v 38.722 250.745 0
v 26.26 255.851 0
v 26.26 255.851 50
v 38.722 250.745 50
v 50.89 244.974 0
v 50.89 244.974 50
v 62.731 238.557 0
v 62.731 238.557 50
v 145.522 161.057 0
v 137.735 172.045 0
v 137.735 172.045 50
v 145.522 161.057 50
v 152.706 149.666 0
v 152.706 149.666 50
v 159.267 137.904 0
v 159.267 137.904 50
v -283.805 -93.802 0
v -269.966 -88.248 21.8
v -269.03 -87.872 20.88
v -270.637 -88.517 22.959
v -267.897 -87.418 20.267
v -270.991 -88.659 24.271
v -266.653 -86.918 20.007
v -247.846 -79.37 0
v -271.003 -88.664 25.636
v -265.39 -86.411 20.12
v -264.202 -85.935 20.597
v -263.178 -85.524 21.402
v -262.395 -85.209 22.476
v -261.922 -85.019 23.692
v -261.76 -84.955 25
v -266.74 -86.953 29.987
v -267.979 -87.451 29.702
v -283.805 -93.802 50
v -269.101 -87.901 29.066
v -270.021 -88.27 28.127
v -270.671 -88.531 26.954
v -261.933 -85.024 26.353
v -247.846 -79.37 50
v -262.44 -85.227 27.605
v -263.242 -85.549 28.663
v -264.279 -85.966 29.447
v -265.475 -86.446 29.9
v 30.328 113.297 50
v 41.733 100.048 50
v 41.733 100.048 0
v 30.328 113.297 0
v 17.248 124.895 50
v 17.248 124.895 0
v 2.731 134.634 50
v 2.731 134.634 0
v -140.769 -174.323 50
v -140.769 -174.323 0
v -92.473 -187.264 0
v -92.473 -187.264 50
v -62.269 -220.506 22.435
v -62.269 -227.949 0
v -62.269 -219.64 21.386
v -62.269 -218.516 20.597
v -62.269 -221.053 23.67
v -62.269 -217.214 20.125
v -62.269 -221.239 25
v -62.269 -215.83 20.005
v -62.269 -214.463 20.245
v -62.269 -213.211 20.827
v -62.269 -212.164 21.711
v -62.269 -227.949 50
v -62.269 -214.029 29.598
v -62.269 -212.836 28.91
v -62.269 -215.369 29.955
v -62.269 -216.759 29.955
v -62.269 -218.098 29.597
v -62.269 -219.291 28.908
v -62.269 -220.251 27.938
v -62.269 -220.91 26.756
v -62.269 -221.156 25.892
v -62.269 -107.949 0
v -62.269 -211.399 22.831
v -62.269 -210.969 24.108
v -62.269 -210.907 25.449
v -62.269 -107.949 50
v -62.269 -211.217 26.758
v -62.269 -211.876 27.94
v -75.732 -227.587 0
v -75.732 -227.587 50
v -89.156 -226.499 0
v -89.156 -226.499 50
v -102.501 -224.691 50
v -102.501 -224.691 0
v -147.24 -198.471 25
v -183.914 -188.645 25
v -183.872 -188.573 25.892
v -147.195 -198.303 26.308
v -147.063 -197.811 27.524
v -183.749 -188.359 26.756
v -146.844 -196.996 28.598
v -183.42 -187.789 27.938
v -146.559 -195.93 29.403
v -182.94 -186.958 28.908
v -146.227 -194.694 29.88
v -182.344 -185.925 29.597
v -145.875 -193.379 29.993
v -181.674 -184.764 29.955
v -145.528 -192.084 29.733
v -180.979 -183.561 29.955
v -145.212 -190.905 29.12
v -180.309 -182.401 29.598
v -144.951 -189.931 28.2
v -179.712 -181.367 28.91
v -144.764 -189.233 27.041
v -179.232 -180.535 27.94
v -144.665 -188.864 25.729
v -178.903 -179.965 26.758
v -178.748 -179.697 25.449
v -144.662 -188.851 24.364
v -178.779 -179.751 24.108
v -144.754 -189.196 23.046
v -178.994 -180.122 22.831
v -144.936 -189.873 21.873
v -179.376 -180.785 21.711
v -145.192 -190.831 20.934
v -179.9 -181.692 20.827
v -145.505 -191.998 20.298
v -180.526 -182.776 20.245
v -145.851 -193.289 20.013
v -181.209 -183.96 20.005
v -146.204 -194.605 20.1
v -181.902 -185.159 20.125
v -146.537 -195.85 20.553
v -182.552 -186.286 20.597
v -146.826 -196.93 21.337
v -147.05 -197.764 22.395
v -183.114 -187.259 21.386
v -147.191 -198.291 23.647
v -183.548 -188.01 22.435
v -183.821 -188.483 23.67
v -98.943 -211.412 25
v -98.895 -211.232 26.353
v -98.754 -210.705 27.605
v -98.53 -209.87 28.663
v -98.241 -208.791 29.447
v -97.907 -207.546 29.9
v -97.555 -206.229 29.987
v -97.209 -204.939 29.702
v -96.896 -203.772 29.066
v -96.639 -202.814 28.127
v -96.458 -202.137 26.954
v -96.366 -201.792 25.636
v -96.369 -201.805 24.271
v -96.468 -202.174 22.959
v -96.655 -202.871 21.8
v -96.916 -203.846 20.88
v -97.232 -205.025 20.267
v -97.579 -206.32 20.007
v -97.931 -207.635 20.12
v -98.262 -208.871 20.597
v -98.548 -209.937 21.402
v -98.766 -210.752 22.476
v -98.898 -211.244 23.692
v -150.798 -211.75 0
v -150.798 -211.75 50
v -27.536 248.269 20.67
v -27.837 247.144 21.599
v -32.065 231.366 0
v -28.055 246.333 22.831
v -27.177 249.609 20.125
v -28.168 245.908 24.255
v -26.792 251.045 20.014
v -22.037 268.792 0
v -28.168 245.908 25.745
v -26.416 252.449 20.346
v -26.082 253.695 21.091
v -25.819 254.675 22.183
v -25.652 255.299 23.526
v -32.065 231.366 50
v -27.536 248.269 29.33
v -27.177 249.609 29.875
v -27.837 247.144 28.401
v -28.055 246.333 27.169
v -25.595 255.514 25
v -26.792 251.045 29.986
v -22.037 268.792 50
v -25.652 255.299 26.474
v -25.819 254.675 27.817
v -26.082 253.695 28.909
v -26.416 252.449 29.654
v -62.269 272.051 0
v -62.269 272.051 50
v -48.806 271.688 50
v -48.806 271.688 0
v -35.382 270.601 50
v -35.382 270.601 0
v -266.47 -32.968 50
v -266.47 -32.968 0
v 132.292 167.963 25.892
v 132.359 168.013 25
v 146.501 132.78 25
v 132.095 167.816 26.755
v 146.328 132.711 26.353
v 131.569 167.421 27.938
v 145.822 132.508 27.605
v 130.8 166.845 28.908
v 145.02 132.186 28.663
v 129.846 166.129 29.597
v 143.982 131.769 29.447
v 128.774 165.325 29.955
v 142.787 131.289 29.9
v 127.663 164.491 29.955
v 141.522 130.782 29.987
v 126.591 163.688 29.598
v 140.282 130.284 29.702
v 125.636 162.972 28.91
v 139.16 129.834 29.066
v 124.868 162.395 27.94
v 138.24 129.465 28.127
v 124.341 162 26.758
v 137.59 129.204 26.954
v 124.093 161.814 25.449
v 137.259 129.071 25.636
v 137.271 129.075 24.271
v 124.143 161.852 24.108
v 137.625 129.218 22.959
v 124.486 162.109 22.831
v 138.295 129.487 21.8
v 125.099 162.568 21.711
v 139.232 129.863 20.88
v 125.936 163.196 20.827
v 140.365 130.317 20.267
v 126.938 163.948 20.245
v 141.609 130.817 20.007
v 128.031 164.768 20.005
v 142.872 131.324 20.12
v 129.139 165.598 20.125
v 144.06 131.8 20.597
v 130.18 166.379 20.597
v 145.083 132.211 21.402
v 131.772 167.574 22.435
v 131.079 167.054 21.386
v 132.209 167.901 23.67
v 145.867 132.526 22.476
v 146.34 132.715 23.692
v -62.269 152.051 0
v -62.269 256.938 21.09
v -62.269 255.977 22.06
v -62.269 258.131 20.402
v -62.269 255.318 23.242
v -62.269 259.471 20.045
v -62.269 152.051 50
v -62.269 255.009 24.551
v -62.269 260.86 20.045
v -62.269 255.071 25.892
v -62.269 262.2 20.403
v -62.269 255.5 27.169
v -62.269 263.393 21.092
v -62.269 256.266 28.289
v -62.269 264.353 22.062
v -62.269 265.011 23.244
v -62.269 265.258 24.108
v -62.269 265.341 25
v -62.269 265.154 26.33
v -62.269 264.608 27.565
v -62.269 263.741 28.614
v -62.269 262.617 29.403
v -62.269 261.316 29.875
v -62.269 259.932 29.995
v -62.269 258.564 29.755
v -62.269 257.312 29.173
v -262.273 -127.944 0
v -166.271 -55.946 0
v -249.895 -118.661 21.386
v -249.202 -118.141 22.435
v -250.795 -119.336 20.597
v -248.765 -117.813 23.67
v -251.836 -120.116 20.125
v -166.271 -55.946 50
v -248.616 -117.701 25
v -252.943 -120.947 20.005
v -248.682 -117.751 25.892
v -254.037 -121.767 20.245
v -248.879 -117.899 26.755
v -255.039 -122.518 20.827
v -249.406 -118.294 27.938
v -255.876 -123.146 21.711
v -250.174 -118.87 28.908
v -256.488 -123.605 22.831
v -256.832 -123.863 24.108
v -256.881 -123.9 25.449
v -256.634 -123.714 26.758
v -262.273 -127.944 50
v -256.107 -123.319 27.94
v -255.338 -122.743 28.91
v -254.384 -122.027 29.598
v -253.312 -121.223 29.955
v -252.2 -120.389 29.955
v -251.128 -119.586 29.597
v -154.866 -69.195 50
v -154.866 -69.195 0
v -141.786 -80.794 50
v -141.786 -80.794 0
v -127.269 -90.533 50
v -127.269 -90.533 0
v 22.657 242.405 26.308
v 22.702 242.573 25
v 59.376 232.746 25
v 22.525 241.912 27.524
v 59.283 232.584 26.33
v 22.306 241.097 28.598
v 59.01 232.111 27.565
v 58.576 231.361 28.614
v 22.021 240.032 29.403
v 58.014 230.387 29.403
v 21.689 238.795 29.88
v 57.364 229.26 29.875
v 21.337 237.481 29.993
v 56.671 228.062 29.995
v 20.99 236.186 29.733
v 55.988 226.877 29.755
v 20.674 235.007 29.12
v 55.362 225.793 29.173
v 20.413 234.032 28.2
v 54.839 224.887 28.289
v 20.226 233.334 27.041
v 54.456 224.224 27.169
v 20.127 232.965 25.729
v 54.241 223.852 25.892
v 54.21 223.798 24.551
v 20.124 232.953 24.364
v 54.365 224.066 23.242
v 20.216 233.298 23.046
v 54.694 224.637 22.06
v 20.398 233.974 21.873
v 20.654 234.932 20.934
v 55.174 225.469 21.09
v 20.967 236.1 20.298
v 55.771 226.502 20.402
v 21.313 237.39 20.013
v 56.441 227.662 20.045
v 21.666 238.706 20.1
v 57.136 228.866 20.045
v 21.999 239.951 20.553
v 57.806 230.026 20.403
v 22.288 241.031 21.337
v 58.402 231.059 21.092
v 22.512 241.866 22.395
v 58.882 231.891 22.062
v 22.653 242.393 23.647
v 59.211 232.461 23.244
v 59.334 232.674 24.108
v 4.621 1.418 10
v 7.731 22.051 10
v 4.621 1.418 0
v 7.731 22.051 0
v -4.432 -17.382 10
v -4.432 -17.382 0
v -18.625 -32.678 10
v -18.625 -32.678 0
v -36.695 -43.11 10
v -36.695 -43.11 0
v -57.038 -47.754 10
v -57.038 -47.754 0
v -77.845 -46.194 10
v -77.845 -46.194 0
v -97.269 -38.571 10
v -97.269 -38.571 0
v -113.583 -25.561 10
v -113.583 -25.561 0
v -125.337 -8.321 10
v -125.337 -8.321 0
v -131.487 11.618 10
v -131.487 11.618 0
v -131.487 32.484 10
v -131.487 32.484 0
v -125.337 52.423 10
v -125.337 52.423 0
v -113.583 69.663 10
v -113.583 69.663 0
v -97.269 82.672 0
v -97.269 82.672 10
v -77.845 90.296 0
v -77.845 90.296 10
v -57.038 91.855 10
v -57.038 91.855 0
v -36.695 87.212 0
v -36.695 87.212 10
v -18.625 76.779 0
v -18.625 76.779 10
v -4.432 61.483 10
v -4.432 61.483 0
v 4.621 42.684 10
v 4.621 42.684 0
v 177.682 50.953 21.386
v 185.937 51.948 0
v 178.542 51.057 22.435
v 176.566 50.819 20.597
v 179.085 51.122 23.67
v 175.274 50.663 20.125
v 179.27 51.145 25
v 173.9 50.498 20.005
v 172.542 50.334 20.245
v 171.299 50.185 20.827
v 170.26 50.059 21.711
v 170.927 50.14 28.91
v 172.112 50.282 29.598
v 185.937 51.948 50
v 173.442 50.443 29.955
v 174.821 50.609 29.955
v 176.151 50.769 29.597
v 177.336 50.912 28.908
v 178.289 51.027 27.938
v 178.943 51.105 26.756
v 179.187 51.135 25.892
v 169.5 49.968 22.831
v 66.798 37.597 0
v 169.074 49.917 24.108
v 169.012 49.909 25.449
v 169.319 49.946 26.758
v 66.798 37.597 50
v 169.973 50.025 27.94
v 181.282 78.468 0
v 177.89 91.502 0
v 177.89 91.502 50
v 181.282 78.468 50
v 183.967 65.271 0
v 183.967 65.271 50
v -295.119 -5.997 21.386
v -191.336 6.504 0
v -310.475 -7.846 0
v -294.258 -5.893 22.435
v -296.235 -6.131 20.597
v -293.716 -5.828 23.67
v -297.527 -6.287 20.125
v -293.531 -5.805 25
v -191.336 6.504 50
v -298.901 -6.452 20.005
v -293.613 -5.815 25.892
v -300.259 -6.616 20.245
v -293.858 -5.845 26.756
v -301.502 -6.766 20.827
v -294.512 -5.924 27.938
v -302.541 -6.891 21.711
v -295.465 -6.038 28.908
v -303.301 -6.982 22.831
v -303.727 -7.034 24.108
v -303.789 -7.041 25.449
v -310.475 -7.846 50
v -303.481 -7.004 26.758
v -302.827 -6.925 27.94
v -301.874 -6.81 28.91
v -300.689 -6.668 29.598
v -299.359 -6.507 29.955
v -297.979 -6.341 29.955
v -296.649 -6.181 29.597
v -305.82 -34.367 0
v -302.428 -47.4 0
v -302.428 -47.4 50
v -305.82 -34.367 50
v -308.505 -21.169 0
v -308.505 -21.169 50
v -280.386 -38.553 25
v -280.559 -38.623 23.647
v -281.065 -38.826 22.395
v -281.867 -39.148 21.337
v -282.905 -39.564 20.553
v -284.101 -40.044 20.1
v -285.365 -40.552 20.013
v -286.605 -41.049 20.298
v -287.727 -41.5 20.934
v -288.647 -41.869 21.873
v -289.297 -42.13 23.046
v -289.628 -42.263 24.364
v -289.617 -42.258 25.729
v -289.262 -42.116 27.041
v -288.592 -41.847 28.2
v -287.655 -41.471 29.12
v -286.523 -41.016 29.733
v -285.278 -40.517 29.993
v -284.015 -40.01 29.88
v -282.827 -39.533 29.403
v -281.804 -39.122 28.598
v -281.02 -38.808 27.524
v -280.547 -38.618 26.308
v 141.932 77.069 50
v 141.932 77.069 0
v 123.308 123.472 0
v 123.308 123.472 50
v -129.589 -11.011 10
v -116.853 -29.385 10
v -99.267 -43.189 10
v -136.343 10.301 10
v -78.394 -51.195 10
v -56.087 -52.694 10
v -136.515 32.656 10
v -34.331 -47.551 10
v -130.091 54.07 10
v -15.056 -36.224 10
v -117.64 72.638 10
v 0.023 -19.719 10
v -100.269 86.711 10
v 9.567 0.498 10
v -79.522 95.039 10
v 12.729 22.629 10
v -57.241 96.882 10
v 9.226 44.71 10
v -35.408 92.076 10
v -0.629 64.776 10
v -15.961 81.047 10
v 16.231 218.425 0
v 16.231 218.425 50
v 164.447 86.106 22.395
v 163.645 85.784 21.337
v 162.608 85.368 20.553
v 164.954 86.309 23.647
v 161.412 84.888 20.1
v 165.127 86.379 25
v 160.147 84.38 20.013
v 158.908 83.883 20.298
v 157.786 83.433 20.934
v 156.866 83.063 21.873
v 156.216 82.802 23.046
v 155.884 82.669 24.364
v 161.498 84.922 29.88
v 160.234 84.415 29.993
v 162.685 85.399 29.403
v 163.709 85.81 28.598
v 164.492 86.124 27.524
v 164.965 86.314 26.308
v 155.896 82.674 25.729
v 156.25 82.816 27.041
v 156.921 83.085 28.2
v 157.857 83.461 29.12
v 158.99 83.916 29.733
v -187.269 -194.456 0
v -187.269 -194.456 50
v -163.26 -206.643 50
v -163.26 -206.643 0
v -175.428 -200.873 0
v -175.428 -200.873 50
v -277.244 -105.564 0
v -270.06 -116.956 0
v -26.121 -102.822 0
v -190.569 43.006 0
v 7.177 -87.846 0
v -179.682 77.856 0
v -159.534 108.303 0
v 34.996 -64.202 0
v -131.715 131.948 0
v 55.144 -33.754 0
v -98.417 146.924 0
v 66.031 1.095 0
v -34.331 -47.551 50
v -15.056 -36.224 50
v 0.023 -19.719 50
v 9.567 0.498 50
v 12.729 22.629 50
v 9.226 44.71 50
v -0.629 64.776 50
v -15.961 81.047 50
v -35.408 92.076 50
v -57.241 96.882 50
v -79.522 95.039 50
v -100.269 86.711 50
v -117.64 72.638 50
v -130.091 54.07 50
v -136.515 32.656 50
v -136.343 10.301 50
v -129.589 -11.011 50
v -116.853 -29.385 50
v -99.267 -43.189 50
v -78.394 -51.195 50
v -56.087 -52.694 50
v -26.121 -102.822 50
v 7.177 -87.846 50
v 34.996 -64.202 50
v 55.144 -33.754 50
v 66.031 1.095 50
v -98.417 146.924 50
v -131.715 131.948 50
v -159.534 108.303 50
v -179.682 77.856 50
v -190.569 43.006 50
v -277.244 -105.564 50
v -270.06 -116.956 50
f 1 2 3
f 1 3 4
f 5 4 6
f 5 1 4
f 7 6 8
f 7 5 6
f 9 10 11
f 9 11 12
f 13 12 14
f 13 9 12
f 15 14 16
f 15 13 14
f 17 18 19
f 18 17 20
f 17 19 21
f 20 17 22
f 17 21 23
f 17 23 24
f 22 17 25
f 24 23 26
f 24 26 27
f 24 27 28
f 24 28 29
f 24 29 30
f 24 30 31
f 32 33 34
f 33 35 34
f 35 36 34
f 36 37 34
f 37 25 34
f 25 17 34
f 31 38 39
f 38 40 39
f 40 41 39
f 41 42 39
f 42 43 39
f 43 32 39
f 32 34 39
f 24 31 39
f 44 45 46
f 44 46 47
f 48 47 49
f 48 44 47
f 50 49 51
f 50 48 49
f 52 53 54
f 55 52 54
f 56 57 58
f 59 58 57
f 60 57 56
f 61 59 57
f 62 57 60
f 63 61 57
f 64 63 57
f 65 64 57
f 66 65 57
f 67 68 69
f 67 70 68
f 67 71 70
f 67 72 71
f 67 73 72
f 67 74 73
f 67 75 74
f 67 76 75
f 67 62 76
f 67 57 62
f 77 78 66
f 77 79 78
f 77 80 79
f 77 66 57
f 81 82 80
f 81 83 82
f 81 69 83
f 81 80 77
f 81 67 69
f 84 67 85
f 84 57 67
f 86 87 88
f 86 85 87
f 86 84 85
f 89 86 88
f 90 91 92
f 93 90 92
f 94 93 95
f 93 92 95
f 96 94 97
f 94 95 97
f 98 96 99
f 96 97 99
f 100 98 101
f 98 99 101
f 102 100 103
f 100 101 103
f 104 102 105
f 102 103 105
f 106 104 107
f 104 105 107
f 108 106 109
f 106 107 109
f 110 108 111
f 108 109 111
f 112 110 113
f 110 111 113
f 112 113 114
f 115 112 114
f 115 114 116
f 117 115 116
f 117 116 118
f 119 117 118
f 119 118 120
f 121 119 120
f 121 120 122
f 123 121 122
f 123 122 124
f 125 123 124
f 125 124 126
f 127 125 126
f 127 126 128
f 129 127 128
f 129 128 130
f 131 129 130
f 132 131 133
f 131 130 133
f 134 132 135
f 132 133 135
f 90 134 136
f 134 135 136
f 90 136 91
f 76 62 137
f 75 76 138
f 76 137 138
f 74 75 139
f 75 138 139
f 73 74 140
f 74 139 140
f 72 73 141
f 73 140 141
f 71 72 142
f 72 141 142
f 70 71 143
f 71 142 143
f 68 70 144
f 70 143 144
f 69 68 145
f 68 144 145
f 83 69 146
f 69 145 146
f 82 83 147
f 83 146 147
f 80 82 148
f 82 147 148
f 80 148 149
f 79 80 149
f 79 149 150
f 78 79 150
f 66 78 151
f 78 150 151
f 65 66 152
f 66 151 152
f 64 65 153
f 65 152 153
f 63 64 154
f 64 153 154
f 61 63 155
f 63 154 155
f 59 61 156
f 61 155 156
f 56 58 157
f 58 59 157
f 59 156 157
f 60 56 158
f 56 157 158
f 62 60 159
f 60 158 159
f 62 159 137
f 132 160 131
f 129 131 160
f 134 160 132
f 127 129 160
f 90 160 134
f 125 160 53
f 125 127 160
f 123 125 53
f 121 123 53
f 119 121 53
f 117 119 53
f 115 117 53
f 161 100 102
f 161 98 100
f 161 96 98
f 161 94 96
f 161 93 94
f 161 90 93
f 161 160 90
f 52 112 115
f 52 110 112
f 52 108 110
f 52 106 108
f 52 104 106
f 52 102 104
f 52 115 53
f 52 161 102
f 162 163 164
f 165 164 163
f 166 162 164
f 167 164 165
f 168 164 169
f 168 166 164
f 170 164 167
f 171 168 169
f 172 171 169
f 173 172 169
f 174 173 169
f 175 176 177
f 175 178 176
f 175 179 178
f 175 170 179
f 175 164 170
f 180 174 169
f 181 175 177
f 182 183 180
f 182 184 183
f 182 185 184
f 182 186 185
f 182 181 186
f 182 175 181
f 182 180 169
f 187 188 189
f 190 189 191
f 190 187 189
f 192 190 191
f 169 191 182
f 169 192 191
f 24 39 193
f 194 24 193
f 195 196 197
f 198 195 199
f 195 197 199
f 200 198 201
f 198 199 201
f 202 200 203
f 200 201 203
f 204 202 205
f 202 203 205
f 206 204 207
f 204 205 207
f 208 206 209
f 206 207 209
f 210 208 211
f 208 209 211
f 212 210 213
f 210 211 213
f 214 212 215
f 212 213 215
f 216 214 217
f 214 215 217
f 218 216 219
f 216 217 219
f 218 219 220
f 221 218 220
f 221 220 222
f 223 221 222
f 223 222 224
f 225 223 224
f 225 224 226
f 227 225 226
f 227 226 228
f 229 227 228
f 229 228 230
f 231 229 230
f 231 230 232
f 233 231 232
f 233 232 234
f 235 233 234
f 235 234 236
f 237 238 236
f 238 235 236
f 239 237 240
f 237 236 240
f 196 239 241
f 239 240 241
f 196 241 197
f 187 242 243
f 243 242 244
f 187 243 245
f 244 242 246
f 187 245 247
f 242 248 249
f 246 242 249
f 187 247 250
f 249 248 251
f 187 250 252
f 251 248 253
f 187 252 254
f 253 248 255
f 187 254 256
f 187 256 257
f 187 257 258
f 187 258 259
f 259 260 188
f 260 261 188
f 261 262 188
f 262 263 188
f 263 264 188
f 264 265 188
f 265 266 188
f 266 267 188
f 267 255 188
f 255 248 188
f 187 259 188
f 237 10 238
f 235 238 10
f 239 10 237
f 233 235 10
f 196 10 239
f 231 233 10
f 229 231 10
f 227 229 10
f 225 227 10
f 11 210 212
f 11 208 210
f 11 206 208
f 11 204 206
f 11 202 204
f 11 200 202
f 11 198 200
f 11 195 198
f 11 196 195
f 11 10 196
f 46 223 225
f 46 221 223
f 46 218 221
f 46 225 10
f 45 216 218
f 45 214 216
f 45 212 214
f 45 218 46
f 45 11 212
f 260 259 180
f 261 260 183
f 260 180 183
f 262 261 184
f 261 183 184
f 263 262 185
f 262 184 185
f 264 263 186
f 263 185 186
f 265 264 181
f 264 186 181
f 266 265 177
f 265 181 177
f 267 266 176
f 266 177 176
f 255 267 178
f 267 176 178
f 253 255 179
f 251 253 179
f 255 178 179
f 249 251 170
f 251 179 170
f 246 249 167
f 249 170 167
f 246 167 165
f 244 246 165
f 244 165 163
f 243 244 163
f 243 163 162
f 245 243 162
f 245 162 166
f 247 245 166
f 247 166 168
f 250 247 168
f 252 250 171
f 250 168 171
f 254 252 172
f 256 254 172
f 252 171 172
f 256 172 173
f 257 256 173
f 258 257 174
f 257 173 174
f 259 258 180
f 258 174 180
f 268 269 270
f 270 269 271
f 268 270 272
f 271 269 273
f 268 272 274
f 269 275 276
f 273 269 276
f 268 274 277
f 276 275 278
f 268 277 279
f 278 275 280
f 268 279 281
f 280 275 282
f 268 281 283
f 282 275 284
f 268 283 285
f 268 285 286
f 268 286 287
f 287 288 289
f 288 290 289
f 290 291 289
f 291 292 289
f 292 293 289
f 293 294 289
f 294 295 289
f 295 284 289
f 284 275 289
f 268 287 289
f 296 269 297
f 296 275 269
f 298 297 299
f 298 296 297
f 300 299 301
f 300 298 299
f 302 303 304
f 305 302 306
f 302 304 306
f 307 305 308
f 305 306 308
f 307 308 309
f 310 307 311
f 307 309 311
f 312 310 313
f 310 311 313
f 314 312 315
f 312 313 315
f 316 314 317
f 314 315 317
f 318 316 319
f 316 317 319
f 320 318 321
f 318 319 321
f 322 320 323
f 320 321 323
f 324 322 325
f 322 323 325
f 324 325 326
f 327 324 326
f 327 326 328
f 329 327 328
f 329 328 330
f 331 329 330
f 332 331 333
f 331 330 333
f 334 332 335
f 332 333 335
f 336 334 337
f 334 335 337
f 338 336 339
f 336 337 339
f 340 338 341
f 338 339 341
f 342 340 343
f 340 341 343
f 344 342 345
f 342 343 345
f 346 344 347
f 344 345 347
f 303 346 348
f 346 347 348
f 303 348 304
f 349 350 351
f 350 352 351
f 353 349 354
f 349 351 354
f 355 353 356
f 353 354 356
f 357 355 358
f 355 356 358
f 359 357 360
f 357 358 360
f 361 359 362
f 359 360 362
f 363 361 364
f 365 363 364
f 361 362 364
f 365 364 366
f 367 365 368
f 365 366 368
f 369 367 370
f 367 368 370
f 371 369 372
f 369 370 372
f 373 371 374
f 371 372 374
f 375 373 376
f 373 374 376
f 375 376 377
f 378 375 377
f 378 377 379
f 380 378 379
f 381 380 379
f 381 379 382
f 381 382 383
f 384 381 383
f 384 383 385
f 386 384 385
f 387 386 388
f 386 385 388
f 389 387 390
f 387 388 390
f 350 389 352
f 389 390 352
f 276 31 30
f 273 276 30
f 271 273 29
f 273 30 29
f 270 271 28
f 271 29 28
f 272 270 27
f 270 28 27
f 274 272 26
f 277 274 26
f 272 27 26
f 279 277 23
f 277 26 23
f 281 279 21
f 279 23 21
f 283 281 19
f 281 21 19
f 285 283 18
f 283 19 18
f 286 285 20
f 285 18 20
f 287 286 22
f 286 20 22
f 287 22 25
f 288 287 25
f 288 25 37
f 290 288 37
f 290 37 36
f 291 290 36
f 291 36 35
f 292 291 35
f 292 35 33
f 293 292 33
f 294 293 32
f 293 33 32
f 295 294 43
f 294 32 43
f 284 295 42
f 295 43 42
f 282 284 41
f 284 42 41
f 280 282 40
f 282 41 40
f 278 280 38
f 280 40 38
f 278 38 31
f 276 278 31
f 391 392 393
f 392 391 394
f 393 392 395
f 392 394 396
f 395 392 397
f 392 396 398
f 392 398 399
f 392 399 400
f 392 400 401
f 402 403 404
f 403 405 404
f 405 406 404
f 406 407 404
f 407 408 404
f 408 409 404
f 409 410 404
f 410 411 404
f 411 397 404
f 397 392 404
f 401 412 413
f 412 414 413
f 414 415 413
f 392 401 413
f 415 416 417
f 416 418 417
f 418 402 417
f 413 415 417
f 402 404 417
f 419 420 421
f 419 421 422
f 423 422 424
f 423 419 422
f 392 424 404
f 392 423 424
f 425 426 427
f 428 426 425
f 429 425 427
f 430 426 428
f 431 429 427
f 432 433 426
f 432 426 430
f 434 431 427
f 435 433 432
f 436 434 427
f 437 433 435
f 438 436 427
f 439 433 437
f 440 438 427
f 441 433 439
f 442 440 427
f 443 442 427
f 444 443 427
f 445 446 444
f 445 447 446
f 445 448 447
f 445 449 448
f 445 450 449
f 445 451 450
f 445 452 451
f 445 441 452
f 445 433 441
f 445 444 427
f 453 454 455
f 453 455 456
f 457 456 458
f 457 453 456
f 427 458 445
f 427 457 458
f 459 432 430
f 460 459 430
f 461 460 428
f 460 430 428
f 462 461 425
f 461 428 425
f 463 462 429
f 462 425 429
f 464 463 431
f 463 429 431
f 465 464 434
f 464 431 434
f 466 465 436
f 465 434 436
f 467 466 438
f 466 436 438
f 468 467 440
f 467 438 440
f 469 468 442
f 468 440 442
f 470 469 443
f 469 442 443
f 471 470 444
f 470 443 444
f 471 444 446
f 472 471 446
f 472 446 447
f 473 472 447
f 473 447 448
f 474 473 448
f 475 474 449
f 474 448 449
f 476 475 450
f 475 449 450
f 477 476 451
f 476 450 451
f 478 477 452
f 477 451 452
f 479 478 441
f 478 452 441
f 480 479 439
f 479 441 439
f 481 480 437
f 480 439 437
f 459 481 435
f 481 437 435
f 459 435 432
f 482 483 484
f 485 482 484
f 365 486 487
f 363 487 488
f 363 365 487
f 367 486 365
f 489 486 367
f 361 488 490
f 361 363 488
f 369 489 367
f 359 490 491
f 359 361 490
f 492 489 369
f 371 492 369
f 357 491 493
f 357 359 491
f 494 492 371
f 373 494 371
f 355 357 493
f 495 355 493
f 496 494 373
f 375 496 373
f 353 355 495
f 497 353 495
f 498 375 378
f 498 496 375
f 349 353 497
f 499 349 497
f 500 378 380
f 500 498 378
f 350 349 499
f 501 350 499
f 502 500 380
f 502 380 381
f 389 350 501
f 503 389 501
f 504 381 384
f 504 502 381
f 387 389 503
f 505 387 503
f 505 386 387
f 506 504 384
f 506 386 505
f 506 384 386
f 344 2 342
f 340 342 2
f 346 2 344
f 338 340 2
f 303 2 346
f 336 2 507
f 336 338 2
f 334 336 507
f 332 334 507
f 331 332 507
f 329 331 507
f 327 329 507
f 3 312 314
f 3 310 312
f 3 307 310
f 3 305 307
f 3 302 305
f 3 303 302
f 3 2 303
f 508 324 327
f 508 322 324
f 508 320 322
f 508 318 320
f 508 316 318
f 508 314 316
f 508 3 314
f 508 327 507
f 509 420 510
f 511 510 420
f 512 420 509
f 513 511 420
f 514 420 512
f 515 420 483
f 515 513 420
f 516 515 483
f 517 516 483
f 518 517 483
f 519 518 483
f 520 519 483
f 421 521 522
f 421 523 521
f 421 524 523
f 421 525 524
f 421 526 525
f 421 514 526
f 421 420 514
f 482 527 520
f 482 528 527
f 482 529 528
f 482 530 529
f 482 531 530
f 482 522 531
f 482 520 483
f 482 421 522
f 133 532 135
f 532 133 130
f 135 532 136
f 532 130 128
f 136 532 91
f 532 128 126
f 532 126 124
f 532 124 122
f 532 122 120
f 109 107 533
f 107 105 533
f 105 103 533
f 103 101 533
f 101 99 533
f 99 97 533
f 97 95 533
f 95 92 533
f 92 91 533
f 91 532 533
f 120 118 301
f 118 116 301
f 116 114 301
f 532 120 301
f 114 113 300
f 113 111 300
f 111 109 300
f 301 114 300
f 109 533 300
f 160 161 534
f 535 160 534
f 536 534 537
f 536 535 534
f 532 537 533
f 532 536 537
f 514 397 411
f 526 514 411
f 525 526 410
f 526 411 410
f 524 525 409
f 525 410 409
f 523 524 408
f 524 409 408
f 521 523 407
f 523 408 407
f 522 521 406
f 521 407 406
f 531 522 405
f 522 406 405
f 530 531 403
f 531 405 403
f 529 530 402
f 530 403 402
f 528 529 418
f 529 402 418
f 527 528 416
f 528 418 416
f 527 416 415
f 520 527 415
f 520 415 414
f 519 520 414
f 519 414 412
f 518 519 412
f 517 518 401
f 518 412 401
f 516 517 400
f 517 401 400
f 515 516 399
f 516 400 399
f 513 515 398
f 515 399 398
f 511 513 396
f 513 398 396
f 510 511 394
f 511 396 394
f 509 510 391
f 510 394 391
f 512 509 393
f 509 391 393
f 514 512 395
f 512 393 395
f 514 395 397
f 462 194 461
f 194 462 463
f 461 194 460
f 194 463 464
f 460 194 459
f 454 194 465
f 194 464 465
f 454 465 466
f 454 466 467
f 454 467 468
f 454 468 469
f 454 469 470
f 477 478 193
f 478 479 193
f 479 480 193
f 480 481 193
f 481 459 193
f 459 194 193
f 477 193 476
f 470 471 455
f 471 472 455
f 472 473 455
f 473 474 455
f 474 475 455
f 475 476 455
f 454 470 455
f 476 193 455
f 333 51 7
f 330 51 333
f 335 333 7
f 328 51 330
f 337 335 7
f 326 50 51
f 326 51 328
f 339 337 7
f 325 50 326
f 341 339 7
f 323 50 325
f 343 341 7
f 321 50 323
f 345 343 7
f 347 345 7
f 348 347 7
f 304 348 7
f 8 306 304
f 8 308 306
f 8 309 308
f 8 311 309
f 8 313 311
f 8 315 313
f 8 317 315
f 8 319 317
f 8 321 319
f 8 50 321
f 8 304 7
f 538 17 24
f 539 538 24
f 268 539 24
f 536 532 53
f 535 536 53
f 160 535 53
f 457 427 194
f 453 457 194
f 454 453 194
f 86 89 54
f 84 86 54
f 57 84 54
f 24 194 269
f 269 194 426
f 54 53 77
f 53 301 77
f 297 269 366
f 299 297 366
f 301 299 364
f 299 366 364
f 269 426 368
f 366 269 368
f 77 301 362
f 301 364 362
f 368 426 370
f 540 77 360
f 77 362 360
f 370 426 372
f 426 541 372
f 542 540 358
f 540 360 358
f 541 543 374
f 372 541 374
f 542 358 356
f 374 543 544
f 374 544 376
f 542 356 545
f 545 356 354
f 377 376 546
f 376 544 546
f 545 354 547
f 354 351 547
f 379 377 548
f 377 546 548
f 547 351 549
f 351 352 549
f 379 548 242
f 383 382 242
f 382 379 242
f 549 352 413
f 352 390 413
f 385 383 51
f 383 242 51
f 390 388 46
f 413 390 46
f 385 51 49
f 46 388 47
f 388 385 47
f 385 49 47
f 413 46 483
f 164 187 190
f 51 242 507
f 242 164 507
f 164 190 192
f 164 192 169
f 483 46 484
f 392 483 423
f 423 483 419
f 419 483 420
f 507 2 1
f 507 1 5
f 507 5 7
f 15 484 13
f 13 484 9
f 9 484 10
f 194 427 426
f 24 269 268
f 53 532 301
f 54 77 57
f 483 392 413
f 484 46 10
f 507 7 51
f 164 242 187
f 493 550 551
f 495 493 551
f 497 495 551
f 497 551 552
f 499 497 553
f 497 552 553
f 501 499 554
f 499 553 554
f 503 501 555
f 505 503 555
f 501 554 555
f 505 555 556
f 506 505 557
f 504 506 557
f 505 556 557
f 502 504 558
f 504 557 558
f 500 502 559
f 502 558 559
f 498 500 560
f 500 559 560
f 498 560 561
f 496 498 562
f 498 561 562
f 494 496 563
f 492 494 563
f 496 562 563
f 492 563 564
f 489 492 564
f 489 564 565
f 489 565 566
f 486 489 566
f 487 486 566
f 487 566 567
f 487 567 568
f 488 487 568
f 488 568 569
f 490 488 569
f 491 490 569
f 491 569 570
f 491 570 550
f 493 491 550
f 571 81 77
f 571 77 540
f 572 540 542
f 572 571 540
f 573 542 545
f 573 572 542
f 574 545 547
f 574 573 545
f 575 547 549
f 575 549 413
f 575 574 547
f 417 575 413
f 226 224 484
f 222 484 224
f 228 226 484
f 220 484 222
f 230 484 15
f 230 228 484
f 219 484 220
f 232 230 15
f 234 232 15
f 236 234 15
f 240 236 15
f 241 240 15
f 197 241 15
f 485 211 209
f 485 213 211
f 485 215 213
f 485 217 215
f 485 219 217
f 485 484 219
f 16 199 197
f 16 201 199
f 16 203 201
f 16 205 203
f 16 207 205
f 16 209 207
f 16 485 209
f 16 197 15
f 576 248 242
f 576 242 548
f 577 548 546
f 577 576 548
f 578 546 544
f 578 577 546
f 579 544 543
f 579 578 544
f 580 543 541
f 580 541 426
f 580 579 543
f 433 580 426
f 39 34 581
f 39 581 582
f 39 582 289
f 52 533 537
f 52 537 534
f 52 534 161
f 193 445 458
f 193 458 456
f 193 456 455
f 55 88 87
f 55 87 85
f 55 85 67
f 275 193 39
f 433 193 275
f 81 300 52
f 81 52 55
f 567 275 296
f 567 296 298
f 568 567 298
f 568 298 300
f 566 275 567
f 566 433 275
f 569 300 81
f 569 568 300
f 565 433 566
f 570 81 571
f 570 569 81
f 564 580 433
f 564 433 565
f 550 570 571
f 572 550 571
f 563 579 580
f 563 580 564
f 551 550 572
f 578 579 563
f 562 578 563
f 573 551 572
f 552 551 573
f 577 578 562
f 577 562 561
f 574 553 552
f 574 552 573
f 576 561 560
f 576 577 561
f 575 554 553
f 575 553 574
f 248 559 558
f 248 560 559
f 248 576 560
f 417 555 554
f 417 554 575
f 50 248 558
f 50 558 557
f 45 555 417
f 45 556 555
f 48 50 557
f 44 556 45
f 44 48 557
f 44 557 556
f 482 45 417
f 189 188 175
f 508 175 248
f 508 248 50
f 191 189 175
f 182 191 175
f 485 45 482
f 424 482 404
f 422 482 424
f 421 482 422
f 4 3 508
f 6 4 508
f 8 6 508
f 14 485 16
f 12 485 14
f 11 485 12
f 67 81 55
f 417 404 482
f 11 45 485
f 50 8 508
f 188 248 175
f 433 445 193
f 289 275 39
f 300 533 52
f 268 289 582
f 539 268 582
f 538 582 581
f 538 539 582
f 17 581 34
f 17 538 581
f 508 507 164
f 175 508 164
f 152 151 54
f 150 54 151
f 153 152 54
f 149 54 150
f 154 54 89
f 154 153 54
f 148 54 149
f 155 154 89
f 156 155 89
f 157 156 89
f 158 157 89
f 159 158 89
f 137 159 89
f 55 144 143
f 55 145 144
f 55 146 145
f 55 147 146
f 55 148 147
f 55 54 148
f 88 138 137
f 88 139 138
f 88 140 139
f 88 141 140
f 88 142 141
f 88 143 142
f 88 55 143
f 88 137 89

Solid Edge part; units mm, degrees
sketch "Sketch1" plane through (0, 0, 0) normal (0, 0, 1) x (1, 0, 0)
  circle A0 centre (-62.269, 22.0507) radius 70
  circle A1 centre (-62.269, 22.0507) radius 250
  dimension "D1" = 500
  dimension "D2" = 140
extrude "Protrusion1" add sketch "Sketch1" along normal blind 50
sketch "Sketch2" plane through (-62.269, 22.0507, 50) normal (0, 0, 1) x (0, 1, 0)
  line L0 (-77.9972, 104.0021) -> (-224.2944, 299.0763)
  line L1 (-224.2944, 299.0763) -> (-306.7248, 177.0877)
  line L2 (-306.7248, 177.0877) -> (-112.5833, 65)
  arc A0 (-77.9972, 104.0021) -> (-112.5833, 65) centre (0, 0) ccw
  line L3 (112.5833, -65) -> (403.4538, -232.9342)
  line L4 (403.4538, -232.9342) -> (235.7459, -314.3458)
  line L5 (235.7459, -314.3458) -> (77.9972, -104.0021)
  arc A1 (77.9972, -104.0021) -> (112.5833, -65) centre (0, 0) ccw
  line L6 (-317.1796, 0) -> (-130, 0)
  arc A2 (-130, 0) -> (15.5465, -129.0671) centre (0, 0) ccw
  line L7 (86.2059, -715.684) -> (15.5465, -129.0671)
  line L8 (-317.1796, 0) -> (86.2059, -715.684)
  arc A3 (130, 0) -> (-15.5465, 129.0671) centre (0, 0) ccw
  line L9 (-15.5465, 129.0671) -> (-39.2378, 325.7531)
  line L10 (-39.2378, 325.7531) -> (379.3774, 186.8257)
  line L11 (379.3774, 186.8257) -> (365.0673, 0)
  line L12 (130, 0) -> (365.0673, 0)
extrude "Cutout1" cut sketch "Sketch2" against normal through all
sketch "Sketch3" plane through (-62.269, 22.0507, 50) normal (0, 0, 1) x (0, 1, 0)
  line L0 (-425.8026, 139.9754) -> (-196.3739, 78.5001)
  line L1 (-196.3739, 78.5001) -> (-209.3149, 30.2039)
  line L2 (-209.3149, 30.2039) -> (-438.7436, 91.6791)
  line L3 (-438.7436, 91.6791) -> (-425.8026, 139.9754)
  line L4 (101.4208, -185.577) -> (153.5361, -315.4253)
  line L5 (153.5361, -315.4253) -> (107.134, -334.049)
  line L6 (107.134, -334.049) -> (55.0187, -204.2007)
  line L7 (55.0187, -204.2007) -> (101.4208, -185.577)
  line L8 (209.3149, -30.2039) -> (455.6, -96.1958)
  line L9 (455.6, -96.1958) -> (442.6591, -144.492)
  line L10 (442.6591, -144.492) -> (196.3739, -78.5001)
  line L11 (196.3739, -78.5001) -> (209.3149, -30.2039)
  line L12 (-161.2539, 334.6546) -> (-101.4208, 185.577)
  line L13 (-101.4208, 185.577) -> (-55.0187, 204.2007)
  line L14 (-55.0187, 204.2007) -> (-114.8518, 353.2783)
  line L15 (-114.8518, 353.2783) -> (-161.2539, 334.6546)
  dimension "D1" = 160.6366
  dimension "D2" = 50
  dimension "D3" = 40
  dimension "D4" = 50
  dimension "D5" = 40
  dimension "D6" = 50
  dimension "D7" = 50
  dimension "D8" = 40
  dimension "D9" = 40
extrude "Cutout2" cut sketch "Sketch3" against normal through all
sketch "Sketch4" plane through (-62.269, 22.0507, 50) normal (0, 0, 1) x (0.3725, -0.928, 0)
  circle A0 centre (0, 0) radius 75
  dimension "D1" = 150
extrude "Cutout3" cut sketch "Sketch4" against normal blind 40
sketch "Sketch5" plane through (-331.9141, 78.0776, 25) normal (0.3725, -0.928, 0) x (0.928, 0.3725, 0)
  circle A0 centre (-0.6266, 0) radius 5
  dimension "D1" = 10
  dimension "D2" = 20
extrude "ExtrudedCutout_18" cut sketch "Sketch5" along normal through all
sketch "Sketch6" plane through (-191.9716, -180.6604, 25) normal (-0.9659, 0.2588, 0) x (-0.2588, -0.9659, 0)
  circle A0 centre (0.6266, 0) radius 5
  dimension "D1" = 10
  dimension "D2" = 20
extrude "ExtrudedCutout_19" cut sketch "Sketch6" against normal through all
sketch "Sketch7" plane through (221.776, -69.8543, 25) normal (0.3725, -0.928, 0) x (0.928, 0.3725, 0)
  circle A0 centre (0.6266, 0) radius 5
  dimension "D1" = 10
  dimension "D2" = 20
extrude "ExtrudedCutout_20" cut sketch "Sketch7" against normal through all
sketch "Sketch8" plane through (83.8094, 220.374, 25) normal (0.9659, -0.2588, 0) x (0.2588, 0.9659, 0)
  circle A0 centre (0.6266, 0) radius 5
  dimension "D1" = 10
  dimension "D2" = 20
extrude "ExtrudedCutout_21" cut sketch "Sketch8" against normal through all
properties material "Aluminum, 6061-T6"
